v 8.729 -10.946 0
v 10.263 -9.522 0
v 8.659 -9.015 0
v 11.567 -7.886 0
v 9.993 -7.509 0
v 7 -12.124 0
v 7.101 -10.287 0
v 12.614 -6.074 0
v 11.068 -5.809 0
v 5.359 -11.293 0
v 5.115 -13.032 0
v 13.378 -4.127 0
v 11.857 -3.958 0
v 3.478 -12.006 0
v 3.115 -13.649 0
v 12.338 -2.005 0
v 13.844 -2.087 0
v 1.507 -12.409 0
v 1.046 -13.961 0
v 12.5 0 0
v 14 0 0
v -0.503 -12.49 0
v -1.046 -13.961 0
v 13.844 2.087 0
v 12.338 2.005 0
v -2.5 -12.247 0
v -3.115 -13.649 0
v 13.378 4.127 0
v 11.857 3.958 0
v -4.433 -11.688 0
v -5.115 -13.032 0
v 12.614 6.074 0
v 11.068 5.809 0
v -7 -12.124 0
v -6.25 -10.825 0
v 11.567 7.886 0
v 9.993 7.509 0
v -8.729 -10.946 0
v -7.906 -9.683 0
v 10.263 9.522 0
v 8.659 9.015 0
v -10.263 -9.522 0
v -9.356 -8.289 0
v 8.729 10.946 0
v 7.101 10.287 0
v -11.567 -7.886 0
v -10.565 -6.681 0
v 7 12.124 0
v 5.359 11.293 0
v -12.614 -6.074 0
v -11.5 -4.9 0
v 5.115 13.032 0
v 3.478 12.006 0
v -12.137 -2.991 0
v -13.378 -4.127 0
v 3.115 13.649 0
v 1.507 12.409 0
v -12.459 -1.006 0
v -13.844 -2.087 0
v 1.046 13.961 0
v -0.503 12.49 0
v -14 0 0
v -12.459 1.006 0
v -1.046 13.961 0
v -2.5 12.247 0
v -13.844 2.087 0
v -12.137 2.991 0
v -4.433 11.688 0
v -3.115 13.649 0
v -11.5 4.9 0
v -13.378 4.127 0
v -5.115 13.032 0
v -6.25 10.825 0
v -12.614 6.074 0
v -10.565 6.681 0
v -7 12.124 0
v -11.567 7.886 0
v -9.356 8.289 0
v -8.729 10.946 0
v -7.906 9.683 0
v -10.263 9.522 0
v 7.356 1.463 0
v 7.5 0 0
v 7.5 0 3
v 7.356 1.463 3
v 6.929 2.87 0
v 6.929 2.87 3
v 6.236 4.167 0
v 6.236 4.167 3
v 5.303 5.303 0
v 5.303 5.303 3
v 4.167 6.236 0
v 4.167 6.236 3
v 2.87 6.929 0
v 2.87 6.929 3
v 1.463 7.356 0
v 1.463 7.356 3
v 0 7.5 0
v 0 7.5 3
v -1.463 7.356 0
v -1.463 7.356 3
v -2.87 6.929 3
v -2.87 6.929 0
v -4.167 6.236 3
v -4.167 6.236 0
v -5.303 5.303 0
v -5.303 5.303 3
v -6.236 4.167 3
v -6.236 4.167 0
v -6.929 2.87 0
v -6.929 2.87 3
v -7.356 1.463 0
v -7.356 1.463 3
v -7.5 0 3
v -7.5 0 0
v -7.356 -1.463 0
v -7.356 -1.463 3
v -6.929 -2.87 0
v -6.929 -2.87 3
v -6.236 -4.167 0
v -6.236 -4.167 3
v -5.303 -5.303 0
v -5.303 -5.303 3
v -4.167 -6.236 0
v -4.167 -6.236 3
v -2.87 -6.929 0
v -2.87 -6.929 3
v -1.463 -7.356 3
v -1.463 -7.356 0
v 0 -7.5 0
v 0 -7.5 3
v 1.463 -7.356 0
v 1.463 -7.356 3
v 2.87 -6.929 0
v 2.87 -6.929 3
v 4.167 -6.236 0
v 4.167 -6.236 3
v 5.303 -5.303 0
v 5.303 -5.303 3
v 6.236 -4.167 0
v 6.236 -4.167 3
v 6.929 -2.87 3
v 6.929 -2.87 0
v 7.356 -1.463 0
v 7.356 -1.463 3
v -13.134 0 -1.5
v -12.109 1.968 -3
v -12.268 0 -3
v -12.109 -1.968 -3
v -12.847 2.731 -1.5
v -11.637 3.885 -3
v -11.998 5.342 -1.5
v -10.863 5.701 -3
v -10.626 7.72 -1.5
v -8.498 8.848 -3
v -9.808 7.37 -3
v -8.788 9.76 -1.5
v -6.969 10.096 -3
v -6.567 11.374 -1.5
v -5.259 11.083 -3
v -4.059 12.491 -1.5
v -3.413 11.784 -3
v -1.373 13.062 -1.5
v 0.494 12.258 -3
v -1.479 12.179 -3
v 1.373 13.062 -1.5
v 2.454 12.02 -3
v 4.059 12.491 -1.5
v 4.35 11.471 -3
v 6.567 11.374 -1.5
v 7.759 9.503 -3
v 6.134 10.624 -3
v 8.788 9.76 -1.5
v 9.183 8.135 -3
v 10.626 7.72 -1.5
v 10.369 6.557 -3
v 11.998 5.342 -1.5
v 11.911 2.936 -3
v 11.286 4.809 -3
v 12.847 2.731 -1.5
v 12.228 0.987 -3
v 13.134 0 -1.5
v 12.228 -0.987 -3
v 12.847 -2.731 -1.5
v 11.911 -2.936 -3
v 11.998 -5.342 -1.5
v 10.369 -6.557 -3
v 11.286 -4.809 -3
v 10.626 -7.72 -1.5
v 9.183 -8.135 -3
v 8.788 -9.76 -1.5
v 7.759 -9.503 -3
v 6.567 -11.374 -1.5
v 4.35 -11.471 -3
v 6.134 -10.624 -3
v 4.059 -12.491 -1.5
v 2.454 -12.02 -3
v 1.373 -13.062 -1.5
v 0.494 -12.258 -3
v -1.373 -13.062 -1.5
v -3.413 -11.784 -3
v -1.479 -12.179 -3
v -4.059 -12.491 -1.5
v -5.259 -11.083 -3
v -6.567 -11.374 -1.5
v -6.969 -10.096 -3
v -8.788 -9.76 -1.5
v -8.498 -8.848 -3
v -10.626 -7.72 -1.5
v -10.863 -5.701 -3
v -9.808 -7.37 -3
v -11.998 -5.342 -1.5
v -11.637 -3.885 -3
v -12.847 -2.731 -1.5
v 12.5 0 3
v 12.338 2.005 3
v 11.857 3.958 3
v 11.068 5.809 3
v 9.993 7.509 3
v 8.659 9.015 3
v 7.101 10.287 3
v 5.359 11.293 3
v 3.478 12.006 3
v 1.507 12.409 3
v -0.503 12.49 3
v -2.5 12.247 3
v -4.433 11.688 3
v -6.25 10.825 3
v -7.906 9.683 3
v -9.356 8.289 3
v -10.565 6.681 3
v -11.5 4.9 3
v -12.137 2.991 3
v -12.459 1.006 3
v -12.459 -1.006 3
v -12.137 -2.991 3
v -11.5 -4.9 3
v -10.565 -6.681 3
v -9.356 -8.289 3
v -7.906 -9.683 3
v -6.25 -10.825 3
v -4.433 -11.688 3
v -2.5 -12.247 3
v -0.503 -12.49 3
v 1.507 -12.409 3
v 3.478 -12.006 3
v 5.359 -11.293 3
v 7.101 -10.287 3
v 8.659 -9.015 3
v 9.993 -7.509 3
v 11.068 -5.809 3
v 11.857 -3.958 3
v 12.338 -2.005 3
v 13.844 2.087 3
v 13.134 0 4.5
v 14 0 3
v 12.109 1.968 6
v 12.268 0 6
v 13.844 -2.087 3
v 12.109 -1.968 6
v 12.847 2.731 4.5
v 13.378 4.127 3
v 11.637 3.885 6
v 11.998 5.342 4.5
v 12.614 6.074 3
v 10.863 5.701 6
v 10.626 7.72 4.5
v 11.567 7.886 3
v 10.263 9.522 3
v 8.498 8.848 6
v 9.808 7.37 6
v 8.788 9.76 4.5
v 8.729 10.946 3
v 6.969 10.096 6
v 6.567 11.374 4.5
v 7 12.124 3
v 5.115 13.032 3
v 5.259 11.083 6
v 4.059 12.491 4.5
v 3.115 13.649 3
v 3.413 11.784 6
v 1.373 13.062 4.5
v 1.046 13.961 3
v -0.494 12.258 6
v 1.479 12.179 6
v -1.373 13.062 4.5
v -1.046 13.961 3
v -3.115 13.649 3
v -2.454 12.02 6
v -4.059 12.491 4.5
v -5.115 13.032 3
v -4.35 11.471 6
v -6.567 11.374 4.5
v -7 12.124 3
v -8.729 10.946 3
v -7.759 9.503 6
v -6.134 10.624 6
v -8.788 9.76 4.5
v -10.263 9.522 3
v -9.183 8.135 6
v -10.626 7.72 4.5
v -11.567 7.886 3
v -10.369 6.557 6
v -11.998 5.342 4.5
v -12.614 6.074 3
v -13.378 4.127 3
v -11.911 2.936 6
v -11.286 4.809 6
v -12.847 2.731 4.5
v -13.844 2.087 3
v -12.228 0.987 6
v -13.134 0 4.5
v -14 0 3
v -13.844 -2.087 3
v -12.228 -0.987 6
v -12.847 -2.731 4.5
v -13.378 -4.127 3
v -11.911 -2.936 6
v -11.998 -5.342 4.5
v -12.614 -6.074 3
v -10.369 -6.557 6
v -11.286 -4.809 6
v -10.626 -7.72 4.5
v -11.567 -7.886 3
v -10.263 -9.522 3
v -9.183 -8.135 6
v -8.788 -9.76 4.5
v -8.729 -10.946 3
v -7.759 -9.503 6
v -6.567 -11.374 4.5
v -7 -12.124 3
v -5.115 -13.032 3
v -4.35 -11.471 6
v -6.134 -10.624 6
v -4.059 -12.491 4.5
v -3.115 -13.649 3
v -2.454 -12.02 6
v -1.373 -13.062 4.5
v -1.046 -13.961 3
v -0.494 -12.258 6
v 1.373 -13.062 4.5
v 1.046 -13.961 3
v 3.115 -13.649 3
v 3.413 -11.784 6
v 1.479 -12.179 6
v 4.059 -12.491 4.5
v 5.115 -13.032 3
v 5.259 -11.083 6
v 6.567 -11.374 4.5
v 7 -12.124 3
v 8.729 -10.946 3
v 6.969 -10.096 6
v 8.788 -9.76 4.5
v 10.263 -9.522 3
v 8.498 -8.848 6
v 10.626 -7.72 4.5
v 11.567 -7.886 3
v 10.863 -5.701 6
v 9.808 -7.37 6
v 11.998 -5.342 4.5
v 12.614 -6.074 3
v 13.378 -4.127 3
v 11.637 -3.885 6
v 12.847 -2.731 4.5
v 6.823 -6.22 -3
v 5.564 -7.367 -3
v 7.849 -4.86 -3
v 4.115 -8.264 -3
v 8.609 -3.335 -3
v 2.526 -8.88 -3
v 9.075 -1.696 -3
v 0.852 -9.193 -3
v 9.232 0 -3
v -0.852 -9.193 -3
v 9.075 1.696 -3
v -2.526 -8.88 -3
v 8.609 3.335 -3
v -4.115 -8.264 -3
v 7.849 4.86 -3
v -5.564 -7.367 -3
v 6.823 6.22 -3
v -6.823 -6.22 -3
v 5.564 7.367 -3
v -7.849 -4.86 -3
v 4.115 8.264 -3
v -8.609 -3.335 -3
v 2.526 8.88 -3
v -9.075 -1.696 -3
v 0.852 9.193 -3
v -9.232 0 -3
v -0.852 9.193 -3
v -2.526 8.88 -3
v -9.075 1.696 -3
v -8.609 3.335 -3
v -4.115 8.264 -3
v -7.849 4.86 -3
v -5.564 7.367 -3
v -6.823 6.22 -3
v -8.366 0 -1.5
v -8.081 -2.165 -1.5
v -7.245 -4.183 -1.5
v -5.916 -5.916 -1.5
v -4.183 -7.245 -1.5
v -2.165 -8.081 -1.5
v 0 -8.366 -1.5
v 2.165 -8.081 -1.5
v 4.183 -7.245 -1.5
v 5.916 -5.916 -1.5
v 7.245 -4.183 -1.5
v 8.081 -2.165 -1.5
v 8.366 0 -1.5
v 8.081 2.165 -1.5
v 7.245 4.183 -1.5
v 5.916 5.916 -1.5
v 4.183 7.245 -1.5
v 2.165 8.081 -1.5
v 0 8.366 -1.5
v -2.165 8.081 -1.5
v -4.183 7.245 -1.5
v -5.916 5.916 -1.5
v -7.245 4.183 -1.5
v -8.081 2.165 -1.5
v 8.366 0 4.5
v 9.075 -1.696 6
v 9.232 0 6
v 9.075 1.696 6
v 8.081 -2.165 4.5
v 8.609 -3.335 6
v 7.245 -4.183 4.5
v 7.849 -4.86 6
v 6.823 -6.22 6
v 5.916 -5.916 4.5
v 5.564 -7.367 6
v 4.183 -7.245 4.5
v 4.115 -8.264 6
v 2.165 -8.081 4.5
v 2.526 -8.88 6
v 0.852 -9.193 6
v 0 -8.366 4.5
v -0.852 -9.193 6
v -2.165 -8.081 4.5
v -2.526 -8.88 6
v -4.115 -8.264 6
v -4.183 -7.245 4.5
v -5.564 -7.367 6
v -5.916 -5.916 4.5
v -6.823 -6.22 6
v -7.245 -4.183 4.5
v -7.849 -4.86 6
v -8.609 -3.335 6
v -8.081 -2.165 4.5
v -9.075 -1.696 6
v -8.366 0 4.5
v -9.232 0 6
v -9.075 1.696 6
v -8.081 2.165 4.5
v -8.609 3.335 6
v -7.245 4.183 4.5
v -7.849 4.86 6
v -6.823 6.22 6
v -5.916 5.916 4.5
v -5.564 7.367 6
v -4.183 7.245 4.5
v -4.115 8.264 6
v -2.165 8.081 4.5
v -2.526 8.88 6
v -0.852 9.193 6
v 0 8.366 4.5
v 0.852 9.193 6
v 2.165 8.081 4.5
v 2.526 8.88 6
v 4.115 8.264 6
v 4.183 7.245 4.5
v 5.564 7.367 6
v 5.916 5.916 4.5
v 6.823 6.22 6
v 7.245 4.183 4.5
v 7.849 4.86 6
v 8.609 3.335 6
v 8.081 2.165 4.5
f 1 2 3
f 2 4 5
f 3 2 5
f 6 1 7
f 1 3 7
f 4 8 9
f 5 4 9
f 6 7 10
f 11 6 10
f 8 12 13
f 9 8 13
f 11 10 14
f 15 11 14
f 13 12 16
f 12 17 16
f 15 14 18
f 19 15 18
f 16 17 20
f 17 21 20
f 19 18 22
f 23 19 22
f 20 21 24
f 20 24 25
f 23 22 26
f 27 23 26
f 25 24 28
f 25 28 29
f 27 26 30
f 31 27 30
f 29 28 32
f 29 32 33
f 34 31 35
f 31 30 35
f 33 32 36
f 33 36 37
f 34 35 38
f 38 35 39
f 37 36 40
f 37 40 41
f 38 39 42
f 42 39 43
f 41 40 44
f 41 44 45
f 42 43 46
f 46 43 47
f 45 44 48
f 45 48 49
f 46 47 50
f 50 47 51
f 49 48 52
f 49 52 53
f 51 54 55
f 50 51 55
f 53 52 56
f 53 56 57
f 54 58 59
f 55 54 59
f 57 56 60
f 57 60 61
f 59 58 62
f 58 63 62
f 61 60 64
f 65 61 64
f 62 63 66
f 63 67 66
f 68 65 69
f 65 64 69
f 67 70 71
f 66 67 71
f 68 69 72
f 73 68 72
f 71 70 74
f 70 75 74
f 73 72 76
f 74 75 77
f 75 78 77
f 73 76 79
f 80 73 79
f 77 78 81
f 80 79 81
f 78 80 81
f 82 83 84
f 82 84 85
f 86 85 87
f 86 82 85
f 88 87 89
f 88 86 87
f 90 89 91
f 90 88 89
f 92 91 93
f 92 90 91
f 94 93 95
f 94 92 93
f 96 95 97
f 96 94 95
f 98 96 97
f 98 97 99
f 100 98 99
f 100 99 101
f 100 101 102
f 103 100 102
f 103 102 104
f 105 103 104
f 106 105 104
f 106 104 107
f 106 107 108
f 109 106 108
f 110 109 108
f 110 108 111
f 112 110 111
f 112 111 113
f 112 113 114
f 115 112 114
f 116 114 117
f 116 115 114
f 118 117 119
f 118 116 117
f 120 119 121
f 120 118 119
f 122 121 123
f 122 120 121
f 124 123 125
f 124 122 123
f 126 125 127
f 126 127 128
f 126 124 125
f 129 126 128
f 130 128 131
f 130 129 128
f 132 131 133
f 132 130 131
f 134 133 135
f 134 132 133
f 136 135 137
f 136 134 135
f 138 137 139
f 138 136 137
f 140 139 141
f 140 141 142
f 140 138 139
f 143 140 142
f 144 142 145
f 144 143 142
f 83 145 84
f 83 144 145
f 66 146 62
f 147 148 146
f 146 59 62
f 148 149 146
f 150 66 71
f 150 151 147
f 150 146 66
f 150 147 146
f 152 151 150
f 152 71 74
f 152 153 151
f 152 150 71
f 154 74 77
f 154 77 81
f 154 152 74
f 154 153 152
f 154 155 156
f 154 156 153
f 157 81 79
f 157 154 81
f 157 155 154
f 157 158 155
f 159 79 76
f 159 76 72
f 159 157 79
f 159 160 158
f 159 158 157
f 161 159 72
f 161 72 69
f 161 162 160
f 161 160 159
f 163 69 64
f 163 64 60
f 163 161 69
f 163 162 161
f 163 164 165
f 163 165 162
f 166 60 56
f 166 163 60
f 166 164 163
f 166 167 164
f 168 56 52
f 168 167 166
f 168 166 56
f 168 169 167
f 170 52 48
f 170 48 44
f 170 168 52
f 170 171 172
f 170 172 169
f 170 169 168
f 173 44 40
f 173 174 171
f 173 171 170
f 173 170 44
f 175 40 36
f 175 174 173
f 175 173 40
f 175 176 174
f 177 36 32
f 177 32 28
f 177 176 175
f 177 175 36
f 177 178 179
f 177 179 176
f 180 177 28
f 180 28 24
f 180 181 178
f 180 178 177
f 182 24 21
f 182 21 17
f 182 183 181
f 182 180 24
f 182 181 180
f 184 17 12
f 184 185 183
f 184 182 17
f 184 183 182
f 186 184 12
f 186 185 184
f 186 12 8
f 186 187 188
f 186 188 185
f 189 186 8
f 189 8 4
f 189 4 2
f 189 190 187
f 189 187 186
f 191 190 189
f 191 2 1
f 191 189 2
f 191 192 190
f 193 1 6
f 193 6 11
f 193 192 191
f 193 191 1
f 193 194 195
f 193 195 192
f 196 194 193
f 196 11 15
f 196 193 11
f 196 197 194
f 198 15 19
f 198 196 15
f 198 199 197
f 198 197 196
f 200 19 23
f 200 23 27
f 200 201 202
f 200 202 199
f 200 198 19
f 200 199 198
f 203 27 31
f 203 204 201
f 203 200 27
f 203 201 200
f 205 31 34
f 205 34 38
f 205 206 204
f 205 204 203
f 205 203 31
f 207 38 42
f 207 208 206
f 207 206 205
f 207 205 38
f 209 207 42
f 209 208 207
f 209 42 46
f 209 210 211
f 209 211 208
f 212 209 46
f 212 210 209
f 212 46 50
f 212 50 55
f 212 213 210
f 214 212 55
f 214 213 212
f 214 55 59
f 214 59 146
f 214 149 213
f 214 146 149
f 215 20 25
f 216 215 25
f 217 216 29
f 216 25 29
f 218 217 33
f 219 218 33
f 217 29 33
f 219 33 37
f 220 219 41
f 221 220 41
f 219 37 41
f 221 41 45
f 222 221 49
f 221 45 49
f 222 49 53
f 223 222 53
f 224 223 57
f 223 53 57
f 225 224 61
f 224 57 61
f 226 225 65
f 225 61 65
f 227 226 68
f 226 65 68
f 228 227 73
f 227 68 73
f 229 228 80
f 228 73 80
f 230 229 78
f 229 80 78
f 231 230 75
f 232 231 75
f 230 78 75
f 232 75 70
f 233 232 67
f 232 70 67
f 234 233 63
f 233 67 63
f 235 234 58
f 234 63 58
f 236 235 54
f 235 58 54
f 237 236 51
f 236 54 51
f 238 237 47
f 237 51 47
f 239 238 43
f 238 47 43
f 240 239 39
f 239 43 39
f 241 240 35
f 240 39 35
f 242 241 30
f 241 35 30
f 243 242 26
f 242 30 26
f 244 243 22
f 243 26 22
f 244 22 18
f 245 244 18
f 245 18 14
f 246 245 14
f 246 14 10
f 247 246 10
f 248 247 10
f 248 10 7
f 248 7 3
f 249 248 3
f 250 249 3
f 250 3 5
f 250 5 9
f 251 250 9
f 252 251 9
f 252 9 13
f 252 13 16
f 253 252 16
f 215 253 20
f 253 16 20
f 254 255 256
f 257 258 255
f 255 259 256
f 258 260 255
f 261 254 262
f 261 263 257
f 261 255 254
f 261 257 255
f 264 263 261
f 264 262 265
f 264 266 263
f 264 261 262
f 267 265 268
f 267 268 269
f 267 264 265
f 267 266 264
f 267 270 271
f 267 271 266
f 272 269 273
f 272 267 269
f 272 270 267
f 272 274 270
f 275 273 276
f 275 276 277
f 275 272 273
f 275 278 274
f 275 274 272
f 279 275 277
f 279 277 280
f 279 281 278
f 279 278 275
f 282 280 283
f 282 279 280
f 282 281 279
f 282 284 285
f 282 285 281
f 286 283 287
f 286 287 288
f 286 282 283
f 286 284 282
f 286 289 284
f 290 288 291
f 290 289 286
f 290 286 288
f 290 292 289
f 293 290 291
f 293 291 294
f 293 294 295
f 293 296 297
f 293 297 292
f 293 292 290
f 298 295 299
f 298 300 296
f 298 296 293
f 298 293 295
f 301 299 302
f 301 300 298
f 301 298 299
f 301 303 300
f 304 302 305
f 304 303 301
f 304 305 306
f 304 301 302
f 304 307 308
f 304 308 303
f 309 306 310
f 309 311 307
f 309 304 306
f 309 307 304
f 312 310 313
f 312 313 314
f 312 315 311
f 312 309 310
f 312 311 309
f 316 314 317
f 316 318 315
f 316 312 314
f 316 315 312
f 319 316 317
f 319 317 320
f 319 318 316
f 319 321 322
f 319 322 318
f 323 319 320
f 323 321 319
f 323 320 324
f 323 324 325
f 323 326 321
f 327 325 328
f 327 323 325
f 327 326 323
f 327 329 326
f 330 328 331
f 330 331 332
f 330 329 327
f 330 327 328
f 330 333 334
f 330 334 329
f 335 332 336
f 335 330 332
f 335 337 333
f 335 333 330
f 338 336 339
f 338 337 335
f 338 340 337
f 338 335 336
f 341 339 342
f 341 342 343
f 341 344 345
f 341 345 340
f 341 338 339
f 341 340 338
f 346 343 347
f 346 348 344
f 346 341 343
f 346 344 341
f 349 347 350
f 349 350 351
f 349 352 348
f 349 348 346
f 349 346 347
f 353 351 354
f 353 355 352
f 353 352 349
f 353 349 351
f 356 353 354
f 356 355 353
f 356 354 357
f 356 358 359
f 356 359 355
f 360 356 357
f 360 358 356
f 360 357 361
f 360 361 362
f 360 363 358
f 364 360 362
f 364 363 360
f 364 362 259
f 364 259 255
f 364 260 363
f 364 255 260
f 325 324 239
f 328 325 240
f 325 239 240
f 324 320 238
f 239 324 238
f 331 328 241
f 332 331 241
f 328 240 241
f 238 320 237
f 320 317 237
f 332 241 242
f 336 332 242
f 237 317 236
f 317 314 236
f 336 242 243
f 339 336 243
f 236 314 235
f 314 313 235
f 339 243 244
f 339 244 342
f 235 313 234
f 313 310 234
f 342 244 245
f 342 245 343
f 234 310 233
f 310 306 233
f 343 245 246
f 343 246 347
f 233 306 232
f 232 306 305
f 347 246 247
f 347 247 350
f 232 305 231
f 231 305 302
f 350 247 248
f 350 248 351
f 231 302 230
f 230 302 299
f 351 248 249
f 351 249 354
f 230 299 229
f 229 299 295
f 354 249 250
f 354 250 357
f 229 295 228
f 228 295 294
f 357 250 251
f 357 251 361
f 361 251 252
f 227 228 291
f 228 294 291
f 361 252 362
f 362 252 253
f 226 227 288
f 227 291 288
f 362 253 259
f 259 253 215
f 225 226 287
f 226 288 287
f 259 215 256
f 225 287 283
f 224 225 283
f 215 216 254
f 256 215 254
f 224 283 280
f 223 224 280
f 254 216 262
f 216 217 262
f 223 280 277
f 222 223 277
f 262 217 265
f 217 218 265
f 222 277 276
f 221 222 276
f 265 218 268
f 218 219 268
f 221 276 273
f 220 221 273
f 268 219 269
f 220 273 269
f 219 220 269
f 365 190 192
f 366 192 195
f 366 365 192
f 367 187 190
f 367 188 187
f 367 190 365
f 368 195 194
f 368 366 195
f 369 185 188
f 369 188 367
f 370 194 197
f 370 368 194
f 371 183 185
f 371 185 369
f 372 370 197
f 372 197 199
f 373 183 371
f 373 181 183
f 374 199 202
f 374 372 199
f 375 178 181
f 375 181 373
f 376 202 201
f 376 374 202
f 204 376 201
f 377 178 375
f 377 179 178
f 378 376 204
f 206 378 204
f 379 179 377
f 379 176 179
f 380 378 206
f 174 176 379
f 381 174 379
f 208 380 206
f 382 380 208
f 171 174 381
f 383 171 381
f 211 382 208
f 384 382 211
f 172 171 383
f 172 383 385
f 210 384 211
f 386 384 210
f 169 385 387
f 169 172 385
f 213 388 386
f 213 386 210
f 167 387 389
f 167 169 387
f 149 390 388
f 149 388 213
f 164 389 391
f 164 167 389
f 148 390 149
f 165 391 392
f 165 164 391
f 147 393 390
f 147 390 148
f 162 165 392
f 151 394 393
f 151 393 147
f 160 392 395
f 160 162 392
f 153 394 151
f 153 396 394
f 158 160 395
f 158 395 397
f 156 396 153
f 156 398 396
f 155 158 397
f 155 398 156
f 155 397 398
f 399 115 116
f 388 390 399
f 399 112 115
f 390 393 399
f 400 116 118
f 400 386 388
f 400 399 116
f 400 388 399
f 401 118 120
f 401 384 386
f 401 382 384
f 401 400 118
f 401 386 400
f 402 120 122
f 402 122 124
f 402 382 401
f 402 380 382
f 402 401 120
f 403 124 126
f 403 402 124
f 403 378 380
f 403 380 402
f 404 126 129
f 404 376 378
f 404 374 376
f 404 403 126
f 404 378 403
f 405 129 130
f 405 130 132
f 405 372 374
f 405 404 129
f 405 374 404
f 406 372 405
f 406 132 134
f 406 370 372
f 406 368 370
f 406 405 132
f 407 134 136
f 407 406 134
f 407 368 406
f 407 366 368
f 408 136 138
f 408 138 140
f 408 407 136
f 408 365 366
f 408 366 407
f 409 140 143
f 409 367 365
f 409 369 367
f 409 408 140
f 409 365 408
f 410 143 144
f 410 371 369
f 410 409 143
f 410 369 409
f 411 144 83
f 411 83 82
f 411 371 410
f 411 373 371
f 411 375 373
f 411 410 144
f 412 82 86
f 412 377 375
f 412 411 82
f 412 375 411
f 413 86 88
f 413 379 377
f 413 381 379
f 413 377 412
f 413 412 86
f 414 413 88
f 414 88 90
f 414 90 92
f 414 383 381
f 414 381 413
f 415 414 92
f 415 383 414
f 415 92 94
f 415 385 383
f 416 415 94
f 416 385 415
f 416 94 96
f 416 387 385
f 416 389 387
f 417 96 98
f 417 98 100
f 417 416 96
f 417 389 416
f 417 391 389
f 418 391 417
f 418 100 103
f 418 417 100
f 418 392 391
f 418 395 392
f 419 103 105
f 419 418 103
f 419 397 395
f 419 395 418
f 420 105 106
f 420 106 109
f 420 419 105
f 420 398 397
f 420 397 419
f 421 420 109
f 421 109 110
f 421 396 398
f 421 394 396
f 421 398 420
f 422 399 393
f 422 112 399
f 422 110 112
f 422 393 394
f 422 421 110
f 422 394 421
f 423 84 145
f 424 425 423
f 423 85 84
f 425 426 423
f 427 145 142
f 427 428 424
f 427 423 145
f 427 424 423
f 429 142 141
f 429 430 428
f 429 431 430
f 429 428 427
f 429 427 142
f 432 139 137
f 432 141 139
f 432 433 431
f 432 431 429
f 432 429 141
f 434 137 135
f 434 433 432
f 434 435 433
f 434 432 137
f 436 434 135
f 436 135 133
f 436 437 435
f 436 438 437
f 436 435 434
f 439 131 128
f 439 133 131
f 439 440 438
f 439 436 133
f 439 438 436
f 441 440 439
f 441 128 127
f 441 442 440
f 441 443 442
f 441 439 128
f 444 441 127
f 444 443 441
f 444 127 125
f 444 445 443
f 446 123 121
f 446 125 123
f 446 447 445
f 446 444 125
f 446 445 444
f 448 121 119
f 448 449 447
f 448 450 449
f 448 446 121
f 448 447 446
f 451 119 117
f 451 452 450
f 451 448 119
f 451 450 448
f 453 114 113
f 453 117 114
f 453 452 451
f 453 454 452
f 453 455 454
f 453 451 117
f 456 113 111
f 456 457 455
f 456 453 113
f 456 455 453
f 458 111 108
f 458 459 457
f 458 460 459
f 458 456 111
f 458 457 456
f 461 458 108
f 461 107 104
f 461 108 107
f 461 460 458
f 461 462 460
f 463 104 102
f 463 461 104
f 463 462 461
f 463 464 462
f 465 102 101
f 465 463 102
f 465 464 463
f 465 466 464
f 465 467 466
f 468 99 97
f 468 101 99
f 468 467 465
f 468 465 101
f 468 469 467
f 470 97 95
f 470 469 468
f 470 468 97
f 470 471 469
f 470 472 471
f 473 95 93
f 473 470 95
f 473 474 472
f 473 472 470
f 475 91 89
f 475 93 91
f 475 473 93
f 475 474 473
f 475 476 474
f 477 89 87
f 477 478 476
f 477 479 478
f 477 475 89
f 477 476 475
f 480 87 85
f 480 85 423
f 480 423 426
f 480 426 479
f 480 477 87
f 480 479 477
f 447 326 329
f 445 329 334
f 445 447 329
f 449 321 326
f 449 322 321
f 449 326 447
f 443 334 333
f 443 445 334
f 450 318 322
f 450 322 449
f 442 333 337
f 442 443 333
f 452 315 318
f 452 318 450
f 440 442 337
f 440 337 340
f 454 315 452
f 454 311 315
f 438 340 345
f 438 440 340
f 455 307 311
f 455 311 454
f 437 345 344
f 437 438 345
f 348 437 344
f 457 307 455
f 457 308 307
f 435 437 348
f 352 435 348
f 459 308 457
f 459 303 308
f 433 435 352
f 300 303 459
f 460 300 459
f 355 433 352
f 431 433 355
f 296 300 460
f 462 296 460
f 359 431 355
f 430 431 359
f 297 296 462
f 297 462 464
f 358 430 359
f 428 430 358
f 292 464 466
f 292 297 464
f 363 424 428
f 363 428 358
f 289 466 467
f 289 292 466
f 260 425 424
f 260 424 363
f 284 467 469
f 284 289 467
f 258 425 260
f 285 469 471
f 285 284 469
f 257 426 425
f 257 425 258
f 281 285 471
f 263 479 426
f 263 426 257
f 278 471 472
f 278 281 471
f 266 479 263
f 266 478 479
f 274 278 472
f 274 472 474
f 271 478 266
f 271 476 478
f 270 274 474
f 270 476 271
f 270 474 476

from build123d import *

# Parameters (mm, degrees)
SKETCH1_R           = 12.5
SKETCH1_R_2         = 7.5
BOSS_EXTRUDE1_DEPTH = 3
SKETCH2_R           = 14
SKETCH2_R_2         = 7.5
BOSS_EXTRUDE2_DEPTH = 3
BOSS_EXTRUDE2_TAPER = 30
SKETCH3_R           = 14
SKETCH3_R_2         = 7.5
BOSS_EXTRUDE3_DEPTH = 3
BOSS_EXTRUDE3_TAPER = 30


with BuildPart() as part:
    # Sketch1 → Boss-Extrude1 (new body)
    with BuildSketch(Plane.XY):
        Circle(SKETCH1_R)
        Circle(SKETCH1_R_2, mode=Mode.SUBTRACT)
    extrude(amount=BOSS_EXTRUDE1_DEPTH)

    # Sketch2 → Boss-Extrude2 (add)
    with BuildSketch(Plane.XY.offset(3)):
        Circle(SKETCH2_R)
        Circle(SKETCH2_R_2, mode=Mode.SUBTRACT)
    extrude(amount=BOSS_EXTRUDE2_DEPTH, taper=BOSS_EXTRUDE2_TAPER)

    # Sketch3 → Boss-Extrude3 (add)
    with BuildSketch(Plane(origin=(0, 0, 0), x_dir=(-1, 0, 0), z_dir=(0, 0, -1))):
        Circle(SKETCH3_R)
        Circle(SKETCH3_R_2, mode=Mode.SUBTRACT)
    extrude(amount=BOSS_EXTRUDE3_DEPTH, taper=BOSS_EXTRUDE3_TAPER)


solid = part.part
